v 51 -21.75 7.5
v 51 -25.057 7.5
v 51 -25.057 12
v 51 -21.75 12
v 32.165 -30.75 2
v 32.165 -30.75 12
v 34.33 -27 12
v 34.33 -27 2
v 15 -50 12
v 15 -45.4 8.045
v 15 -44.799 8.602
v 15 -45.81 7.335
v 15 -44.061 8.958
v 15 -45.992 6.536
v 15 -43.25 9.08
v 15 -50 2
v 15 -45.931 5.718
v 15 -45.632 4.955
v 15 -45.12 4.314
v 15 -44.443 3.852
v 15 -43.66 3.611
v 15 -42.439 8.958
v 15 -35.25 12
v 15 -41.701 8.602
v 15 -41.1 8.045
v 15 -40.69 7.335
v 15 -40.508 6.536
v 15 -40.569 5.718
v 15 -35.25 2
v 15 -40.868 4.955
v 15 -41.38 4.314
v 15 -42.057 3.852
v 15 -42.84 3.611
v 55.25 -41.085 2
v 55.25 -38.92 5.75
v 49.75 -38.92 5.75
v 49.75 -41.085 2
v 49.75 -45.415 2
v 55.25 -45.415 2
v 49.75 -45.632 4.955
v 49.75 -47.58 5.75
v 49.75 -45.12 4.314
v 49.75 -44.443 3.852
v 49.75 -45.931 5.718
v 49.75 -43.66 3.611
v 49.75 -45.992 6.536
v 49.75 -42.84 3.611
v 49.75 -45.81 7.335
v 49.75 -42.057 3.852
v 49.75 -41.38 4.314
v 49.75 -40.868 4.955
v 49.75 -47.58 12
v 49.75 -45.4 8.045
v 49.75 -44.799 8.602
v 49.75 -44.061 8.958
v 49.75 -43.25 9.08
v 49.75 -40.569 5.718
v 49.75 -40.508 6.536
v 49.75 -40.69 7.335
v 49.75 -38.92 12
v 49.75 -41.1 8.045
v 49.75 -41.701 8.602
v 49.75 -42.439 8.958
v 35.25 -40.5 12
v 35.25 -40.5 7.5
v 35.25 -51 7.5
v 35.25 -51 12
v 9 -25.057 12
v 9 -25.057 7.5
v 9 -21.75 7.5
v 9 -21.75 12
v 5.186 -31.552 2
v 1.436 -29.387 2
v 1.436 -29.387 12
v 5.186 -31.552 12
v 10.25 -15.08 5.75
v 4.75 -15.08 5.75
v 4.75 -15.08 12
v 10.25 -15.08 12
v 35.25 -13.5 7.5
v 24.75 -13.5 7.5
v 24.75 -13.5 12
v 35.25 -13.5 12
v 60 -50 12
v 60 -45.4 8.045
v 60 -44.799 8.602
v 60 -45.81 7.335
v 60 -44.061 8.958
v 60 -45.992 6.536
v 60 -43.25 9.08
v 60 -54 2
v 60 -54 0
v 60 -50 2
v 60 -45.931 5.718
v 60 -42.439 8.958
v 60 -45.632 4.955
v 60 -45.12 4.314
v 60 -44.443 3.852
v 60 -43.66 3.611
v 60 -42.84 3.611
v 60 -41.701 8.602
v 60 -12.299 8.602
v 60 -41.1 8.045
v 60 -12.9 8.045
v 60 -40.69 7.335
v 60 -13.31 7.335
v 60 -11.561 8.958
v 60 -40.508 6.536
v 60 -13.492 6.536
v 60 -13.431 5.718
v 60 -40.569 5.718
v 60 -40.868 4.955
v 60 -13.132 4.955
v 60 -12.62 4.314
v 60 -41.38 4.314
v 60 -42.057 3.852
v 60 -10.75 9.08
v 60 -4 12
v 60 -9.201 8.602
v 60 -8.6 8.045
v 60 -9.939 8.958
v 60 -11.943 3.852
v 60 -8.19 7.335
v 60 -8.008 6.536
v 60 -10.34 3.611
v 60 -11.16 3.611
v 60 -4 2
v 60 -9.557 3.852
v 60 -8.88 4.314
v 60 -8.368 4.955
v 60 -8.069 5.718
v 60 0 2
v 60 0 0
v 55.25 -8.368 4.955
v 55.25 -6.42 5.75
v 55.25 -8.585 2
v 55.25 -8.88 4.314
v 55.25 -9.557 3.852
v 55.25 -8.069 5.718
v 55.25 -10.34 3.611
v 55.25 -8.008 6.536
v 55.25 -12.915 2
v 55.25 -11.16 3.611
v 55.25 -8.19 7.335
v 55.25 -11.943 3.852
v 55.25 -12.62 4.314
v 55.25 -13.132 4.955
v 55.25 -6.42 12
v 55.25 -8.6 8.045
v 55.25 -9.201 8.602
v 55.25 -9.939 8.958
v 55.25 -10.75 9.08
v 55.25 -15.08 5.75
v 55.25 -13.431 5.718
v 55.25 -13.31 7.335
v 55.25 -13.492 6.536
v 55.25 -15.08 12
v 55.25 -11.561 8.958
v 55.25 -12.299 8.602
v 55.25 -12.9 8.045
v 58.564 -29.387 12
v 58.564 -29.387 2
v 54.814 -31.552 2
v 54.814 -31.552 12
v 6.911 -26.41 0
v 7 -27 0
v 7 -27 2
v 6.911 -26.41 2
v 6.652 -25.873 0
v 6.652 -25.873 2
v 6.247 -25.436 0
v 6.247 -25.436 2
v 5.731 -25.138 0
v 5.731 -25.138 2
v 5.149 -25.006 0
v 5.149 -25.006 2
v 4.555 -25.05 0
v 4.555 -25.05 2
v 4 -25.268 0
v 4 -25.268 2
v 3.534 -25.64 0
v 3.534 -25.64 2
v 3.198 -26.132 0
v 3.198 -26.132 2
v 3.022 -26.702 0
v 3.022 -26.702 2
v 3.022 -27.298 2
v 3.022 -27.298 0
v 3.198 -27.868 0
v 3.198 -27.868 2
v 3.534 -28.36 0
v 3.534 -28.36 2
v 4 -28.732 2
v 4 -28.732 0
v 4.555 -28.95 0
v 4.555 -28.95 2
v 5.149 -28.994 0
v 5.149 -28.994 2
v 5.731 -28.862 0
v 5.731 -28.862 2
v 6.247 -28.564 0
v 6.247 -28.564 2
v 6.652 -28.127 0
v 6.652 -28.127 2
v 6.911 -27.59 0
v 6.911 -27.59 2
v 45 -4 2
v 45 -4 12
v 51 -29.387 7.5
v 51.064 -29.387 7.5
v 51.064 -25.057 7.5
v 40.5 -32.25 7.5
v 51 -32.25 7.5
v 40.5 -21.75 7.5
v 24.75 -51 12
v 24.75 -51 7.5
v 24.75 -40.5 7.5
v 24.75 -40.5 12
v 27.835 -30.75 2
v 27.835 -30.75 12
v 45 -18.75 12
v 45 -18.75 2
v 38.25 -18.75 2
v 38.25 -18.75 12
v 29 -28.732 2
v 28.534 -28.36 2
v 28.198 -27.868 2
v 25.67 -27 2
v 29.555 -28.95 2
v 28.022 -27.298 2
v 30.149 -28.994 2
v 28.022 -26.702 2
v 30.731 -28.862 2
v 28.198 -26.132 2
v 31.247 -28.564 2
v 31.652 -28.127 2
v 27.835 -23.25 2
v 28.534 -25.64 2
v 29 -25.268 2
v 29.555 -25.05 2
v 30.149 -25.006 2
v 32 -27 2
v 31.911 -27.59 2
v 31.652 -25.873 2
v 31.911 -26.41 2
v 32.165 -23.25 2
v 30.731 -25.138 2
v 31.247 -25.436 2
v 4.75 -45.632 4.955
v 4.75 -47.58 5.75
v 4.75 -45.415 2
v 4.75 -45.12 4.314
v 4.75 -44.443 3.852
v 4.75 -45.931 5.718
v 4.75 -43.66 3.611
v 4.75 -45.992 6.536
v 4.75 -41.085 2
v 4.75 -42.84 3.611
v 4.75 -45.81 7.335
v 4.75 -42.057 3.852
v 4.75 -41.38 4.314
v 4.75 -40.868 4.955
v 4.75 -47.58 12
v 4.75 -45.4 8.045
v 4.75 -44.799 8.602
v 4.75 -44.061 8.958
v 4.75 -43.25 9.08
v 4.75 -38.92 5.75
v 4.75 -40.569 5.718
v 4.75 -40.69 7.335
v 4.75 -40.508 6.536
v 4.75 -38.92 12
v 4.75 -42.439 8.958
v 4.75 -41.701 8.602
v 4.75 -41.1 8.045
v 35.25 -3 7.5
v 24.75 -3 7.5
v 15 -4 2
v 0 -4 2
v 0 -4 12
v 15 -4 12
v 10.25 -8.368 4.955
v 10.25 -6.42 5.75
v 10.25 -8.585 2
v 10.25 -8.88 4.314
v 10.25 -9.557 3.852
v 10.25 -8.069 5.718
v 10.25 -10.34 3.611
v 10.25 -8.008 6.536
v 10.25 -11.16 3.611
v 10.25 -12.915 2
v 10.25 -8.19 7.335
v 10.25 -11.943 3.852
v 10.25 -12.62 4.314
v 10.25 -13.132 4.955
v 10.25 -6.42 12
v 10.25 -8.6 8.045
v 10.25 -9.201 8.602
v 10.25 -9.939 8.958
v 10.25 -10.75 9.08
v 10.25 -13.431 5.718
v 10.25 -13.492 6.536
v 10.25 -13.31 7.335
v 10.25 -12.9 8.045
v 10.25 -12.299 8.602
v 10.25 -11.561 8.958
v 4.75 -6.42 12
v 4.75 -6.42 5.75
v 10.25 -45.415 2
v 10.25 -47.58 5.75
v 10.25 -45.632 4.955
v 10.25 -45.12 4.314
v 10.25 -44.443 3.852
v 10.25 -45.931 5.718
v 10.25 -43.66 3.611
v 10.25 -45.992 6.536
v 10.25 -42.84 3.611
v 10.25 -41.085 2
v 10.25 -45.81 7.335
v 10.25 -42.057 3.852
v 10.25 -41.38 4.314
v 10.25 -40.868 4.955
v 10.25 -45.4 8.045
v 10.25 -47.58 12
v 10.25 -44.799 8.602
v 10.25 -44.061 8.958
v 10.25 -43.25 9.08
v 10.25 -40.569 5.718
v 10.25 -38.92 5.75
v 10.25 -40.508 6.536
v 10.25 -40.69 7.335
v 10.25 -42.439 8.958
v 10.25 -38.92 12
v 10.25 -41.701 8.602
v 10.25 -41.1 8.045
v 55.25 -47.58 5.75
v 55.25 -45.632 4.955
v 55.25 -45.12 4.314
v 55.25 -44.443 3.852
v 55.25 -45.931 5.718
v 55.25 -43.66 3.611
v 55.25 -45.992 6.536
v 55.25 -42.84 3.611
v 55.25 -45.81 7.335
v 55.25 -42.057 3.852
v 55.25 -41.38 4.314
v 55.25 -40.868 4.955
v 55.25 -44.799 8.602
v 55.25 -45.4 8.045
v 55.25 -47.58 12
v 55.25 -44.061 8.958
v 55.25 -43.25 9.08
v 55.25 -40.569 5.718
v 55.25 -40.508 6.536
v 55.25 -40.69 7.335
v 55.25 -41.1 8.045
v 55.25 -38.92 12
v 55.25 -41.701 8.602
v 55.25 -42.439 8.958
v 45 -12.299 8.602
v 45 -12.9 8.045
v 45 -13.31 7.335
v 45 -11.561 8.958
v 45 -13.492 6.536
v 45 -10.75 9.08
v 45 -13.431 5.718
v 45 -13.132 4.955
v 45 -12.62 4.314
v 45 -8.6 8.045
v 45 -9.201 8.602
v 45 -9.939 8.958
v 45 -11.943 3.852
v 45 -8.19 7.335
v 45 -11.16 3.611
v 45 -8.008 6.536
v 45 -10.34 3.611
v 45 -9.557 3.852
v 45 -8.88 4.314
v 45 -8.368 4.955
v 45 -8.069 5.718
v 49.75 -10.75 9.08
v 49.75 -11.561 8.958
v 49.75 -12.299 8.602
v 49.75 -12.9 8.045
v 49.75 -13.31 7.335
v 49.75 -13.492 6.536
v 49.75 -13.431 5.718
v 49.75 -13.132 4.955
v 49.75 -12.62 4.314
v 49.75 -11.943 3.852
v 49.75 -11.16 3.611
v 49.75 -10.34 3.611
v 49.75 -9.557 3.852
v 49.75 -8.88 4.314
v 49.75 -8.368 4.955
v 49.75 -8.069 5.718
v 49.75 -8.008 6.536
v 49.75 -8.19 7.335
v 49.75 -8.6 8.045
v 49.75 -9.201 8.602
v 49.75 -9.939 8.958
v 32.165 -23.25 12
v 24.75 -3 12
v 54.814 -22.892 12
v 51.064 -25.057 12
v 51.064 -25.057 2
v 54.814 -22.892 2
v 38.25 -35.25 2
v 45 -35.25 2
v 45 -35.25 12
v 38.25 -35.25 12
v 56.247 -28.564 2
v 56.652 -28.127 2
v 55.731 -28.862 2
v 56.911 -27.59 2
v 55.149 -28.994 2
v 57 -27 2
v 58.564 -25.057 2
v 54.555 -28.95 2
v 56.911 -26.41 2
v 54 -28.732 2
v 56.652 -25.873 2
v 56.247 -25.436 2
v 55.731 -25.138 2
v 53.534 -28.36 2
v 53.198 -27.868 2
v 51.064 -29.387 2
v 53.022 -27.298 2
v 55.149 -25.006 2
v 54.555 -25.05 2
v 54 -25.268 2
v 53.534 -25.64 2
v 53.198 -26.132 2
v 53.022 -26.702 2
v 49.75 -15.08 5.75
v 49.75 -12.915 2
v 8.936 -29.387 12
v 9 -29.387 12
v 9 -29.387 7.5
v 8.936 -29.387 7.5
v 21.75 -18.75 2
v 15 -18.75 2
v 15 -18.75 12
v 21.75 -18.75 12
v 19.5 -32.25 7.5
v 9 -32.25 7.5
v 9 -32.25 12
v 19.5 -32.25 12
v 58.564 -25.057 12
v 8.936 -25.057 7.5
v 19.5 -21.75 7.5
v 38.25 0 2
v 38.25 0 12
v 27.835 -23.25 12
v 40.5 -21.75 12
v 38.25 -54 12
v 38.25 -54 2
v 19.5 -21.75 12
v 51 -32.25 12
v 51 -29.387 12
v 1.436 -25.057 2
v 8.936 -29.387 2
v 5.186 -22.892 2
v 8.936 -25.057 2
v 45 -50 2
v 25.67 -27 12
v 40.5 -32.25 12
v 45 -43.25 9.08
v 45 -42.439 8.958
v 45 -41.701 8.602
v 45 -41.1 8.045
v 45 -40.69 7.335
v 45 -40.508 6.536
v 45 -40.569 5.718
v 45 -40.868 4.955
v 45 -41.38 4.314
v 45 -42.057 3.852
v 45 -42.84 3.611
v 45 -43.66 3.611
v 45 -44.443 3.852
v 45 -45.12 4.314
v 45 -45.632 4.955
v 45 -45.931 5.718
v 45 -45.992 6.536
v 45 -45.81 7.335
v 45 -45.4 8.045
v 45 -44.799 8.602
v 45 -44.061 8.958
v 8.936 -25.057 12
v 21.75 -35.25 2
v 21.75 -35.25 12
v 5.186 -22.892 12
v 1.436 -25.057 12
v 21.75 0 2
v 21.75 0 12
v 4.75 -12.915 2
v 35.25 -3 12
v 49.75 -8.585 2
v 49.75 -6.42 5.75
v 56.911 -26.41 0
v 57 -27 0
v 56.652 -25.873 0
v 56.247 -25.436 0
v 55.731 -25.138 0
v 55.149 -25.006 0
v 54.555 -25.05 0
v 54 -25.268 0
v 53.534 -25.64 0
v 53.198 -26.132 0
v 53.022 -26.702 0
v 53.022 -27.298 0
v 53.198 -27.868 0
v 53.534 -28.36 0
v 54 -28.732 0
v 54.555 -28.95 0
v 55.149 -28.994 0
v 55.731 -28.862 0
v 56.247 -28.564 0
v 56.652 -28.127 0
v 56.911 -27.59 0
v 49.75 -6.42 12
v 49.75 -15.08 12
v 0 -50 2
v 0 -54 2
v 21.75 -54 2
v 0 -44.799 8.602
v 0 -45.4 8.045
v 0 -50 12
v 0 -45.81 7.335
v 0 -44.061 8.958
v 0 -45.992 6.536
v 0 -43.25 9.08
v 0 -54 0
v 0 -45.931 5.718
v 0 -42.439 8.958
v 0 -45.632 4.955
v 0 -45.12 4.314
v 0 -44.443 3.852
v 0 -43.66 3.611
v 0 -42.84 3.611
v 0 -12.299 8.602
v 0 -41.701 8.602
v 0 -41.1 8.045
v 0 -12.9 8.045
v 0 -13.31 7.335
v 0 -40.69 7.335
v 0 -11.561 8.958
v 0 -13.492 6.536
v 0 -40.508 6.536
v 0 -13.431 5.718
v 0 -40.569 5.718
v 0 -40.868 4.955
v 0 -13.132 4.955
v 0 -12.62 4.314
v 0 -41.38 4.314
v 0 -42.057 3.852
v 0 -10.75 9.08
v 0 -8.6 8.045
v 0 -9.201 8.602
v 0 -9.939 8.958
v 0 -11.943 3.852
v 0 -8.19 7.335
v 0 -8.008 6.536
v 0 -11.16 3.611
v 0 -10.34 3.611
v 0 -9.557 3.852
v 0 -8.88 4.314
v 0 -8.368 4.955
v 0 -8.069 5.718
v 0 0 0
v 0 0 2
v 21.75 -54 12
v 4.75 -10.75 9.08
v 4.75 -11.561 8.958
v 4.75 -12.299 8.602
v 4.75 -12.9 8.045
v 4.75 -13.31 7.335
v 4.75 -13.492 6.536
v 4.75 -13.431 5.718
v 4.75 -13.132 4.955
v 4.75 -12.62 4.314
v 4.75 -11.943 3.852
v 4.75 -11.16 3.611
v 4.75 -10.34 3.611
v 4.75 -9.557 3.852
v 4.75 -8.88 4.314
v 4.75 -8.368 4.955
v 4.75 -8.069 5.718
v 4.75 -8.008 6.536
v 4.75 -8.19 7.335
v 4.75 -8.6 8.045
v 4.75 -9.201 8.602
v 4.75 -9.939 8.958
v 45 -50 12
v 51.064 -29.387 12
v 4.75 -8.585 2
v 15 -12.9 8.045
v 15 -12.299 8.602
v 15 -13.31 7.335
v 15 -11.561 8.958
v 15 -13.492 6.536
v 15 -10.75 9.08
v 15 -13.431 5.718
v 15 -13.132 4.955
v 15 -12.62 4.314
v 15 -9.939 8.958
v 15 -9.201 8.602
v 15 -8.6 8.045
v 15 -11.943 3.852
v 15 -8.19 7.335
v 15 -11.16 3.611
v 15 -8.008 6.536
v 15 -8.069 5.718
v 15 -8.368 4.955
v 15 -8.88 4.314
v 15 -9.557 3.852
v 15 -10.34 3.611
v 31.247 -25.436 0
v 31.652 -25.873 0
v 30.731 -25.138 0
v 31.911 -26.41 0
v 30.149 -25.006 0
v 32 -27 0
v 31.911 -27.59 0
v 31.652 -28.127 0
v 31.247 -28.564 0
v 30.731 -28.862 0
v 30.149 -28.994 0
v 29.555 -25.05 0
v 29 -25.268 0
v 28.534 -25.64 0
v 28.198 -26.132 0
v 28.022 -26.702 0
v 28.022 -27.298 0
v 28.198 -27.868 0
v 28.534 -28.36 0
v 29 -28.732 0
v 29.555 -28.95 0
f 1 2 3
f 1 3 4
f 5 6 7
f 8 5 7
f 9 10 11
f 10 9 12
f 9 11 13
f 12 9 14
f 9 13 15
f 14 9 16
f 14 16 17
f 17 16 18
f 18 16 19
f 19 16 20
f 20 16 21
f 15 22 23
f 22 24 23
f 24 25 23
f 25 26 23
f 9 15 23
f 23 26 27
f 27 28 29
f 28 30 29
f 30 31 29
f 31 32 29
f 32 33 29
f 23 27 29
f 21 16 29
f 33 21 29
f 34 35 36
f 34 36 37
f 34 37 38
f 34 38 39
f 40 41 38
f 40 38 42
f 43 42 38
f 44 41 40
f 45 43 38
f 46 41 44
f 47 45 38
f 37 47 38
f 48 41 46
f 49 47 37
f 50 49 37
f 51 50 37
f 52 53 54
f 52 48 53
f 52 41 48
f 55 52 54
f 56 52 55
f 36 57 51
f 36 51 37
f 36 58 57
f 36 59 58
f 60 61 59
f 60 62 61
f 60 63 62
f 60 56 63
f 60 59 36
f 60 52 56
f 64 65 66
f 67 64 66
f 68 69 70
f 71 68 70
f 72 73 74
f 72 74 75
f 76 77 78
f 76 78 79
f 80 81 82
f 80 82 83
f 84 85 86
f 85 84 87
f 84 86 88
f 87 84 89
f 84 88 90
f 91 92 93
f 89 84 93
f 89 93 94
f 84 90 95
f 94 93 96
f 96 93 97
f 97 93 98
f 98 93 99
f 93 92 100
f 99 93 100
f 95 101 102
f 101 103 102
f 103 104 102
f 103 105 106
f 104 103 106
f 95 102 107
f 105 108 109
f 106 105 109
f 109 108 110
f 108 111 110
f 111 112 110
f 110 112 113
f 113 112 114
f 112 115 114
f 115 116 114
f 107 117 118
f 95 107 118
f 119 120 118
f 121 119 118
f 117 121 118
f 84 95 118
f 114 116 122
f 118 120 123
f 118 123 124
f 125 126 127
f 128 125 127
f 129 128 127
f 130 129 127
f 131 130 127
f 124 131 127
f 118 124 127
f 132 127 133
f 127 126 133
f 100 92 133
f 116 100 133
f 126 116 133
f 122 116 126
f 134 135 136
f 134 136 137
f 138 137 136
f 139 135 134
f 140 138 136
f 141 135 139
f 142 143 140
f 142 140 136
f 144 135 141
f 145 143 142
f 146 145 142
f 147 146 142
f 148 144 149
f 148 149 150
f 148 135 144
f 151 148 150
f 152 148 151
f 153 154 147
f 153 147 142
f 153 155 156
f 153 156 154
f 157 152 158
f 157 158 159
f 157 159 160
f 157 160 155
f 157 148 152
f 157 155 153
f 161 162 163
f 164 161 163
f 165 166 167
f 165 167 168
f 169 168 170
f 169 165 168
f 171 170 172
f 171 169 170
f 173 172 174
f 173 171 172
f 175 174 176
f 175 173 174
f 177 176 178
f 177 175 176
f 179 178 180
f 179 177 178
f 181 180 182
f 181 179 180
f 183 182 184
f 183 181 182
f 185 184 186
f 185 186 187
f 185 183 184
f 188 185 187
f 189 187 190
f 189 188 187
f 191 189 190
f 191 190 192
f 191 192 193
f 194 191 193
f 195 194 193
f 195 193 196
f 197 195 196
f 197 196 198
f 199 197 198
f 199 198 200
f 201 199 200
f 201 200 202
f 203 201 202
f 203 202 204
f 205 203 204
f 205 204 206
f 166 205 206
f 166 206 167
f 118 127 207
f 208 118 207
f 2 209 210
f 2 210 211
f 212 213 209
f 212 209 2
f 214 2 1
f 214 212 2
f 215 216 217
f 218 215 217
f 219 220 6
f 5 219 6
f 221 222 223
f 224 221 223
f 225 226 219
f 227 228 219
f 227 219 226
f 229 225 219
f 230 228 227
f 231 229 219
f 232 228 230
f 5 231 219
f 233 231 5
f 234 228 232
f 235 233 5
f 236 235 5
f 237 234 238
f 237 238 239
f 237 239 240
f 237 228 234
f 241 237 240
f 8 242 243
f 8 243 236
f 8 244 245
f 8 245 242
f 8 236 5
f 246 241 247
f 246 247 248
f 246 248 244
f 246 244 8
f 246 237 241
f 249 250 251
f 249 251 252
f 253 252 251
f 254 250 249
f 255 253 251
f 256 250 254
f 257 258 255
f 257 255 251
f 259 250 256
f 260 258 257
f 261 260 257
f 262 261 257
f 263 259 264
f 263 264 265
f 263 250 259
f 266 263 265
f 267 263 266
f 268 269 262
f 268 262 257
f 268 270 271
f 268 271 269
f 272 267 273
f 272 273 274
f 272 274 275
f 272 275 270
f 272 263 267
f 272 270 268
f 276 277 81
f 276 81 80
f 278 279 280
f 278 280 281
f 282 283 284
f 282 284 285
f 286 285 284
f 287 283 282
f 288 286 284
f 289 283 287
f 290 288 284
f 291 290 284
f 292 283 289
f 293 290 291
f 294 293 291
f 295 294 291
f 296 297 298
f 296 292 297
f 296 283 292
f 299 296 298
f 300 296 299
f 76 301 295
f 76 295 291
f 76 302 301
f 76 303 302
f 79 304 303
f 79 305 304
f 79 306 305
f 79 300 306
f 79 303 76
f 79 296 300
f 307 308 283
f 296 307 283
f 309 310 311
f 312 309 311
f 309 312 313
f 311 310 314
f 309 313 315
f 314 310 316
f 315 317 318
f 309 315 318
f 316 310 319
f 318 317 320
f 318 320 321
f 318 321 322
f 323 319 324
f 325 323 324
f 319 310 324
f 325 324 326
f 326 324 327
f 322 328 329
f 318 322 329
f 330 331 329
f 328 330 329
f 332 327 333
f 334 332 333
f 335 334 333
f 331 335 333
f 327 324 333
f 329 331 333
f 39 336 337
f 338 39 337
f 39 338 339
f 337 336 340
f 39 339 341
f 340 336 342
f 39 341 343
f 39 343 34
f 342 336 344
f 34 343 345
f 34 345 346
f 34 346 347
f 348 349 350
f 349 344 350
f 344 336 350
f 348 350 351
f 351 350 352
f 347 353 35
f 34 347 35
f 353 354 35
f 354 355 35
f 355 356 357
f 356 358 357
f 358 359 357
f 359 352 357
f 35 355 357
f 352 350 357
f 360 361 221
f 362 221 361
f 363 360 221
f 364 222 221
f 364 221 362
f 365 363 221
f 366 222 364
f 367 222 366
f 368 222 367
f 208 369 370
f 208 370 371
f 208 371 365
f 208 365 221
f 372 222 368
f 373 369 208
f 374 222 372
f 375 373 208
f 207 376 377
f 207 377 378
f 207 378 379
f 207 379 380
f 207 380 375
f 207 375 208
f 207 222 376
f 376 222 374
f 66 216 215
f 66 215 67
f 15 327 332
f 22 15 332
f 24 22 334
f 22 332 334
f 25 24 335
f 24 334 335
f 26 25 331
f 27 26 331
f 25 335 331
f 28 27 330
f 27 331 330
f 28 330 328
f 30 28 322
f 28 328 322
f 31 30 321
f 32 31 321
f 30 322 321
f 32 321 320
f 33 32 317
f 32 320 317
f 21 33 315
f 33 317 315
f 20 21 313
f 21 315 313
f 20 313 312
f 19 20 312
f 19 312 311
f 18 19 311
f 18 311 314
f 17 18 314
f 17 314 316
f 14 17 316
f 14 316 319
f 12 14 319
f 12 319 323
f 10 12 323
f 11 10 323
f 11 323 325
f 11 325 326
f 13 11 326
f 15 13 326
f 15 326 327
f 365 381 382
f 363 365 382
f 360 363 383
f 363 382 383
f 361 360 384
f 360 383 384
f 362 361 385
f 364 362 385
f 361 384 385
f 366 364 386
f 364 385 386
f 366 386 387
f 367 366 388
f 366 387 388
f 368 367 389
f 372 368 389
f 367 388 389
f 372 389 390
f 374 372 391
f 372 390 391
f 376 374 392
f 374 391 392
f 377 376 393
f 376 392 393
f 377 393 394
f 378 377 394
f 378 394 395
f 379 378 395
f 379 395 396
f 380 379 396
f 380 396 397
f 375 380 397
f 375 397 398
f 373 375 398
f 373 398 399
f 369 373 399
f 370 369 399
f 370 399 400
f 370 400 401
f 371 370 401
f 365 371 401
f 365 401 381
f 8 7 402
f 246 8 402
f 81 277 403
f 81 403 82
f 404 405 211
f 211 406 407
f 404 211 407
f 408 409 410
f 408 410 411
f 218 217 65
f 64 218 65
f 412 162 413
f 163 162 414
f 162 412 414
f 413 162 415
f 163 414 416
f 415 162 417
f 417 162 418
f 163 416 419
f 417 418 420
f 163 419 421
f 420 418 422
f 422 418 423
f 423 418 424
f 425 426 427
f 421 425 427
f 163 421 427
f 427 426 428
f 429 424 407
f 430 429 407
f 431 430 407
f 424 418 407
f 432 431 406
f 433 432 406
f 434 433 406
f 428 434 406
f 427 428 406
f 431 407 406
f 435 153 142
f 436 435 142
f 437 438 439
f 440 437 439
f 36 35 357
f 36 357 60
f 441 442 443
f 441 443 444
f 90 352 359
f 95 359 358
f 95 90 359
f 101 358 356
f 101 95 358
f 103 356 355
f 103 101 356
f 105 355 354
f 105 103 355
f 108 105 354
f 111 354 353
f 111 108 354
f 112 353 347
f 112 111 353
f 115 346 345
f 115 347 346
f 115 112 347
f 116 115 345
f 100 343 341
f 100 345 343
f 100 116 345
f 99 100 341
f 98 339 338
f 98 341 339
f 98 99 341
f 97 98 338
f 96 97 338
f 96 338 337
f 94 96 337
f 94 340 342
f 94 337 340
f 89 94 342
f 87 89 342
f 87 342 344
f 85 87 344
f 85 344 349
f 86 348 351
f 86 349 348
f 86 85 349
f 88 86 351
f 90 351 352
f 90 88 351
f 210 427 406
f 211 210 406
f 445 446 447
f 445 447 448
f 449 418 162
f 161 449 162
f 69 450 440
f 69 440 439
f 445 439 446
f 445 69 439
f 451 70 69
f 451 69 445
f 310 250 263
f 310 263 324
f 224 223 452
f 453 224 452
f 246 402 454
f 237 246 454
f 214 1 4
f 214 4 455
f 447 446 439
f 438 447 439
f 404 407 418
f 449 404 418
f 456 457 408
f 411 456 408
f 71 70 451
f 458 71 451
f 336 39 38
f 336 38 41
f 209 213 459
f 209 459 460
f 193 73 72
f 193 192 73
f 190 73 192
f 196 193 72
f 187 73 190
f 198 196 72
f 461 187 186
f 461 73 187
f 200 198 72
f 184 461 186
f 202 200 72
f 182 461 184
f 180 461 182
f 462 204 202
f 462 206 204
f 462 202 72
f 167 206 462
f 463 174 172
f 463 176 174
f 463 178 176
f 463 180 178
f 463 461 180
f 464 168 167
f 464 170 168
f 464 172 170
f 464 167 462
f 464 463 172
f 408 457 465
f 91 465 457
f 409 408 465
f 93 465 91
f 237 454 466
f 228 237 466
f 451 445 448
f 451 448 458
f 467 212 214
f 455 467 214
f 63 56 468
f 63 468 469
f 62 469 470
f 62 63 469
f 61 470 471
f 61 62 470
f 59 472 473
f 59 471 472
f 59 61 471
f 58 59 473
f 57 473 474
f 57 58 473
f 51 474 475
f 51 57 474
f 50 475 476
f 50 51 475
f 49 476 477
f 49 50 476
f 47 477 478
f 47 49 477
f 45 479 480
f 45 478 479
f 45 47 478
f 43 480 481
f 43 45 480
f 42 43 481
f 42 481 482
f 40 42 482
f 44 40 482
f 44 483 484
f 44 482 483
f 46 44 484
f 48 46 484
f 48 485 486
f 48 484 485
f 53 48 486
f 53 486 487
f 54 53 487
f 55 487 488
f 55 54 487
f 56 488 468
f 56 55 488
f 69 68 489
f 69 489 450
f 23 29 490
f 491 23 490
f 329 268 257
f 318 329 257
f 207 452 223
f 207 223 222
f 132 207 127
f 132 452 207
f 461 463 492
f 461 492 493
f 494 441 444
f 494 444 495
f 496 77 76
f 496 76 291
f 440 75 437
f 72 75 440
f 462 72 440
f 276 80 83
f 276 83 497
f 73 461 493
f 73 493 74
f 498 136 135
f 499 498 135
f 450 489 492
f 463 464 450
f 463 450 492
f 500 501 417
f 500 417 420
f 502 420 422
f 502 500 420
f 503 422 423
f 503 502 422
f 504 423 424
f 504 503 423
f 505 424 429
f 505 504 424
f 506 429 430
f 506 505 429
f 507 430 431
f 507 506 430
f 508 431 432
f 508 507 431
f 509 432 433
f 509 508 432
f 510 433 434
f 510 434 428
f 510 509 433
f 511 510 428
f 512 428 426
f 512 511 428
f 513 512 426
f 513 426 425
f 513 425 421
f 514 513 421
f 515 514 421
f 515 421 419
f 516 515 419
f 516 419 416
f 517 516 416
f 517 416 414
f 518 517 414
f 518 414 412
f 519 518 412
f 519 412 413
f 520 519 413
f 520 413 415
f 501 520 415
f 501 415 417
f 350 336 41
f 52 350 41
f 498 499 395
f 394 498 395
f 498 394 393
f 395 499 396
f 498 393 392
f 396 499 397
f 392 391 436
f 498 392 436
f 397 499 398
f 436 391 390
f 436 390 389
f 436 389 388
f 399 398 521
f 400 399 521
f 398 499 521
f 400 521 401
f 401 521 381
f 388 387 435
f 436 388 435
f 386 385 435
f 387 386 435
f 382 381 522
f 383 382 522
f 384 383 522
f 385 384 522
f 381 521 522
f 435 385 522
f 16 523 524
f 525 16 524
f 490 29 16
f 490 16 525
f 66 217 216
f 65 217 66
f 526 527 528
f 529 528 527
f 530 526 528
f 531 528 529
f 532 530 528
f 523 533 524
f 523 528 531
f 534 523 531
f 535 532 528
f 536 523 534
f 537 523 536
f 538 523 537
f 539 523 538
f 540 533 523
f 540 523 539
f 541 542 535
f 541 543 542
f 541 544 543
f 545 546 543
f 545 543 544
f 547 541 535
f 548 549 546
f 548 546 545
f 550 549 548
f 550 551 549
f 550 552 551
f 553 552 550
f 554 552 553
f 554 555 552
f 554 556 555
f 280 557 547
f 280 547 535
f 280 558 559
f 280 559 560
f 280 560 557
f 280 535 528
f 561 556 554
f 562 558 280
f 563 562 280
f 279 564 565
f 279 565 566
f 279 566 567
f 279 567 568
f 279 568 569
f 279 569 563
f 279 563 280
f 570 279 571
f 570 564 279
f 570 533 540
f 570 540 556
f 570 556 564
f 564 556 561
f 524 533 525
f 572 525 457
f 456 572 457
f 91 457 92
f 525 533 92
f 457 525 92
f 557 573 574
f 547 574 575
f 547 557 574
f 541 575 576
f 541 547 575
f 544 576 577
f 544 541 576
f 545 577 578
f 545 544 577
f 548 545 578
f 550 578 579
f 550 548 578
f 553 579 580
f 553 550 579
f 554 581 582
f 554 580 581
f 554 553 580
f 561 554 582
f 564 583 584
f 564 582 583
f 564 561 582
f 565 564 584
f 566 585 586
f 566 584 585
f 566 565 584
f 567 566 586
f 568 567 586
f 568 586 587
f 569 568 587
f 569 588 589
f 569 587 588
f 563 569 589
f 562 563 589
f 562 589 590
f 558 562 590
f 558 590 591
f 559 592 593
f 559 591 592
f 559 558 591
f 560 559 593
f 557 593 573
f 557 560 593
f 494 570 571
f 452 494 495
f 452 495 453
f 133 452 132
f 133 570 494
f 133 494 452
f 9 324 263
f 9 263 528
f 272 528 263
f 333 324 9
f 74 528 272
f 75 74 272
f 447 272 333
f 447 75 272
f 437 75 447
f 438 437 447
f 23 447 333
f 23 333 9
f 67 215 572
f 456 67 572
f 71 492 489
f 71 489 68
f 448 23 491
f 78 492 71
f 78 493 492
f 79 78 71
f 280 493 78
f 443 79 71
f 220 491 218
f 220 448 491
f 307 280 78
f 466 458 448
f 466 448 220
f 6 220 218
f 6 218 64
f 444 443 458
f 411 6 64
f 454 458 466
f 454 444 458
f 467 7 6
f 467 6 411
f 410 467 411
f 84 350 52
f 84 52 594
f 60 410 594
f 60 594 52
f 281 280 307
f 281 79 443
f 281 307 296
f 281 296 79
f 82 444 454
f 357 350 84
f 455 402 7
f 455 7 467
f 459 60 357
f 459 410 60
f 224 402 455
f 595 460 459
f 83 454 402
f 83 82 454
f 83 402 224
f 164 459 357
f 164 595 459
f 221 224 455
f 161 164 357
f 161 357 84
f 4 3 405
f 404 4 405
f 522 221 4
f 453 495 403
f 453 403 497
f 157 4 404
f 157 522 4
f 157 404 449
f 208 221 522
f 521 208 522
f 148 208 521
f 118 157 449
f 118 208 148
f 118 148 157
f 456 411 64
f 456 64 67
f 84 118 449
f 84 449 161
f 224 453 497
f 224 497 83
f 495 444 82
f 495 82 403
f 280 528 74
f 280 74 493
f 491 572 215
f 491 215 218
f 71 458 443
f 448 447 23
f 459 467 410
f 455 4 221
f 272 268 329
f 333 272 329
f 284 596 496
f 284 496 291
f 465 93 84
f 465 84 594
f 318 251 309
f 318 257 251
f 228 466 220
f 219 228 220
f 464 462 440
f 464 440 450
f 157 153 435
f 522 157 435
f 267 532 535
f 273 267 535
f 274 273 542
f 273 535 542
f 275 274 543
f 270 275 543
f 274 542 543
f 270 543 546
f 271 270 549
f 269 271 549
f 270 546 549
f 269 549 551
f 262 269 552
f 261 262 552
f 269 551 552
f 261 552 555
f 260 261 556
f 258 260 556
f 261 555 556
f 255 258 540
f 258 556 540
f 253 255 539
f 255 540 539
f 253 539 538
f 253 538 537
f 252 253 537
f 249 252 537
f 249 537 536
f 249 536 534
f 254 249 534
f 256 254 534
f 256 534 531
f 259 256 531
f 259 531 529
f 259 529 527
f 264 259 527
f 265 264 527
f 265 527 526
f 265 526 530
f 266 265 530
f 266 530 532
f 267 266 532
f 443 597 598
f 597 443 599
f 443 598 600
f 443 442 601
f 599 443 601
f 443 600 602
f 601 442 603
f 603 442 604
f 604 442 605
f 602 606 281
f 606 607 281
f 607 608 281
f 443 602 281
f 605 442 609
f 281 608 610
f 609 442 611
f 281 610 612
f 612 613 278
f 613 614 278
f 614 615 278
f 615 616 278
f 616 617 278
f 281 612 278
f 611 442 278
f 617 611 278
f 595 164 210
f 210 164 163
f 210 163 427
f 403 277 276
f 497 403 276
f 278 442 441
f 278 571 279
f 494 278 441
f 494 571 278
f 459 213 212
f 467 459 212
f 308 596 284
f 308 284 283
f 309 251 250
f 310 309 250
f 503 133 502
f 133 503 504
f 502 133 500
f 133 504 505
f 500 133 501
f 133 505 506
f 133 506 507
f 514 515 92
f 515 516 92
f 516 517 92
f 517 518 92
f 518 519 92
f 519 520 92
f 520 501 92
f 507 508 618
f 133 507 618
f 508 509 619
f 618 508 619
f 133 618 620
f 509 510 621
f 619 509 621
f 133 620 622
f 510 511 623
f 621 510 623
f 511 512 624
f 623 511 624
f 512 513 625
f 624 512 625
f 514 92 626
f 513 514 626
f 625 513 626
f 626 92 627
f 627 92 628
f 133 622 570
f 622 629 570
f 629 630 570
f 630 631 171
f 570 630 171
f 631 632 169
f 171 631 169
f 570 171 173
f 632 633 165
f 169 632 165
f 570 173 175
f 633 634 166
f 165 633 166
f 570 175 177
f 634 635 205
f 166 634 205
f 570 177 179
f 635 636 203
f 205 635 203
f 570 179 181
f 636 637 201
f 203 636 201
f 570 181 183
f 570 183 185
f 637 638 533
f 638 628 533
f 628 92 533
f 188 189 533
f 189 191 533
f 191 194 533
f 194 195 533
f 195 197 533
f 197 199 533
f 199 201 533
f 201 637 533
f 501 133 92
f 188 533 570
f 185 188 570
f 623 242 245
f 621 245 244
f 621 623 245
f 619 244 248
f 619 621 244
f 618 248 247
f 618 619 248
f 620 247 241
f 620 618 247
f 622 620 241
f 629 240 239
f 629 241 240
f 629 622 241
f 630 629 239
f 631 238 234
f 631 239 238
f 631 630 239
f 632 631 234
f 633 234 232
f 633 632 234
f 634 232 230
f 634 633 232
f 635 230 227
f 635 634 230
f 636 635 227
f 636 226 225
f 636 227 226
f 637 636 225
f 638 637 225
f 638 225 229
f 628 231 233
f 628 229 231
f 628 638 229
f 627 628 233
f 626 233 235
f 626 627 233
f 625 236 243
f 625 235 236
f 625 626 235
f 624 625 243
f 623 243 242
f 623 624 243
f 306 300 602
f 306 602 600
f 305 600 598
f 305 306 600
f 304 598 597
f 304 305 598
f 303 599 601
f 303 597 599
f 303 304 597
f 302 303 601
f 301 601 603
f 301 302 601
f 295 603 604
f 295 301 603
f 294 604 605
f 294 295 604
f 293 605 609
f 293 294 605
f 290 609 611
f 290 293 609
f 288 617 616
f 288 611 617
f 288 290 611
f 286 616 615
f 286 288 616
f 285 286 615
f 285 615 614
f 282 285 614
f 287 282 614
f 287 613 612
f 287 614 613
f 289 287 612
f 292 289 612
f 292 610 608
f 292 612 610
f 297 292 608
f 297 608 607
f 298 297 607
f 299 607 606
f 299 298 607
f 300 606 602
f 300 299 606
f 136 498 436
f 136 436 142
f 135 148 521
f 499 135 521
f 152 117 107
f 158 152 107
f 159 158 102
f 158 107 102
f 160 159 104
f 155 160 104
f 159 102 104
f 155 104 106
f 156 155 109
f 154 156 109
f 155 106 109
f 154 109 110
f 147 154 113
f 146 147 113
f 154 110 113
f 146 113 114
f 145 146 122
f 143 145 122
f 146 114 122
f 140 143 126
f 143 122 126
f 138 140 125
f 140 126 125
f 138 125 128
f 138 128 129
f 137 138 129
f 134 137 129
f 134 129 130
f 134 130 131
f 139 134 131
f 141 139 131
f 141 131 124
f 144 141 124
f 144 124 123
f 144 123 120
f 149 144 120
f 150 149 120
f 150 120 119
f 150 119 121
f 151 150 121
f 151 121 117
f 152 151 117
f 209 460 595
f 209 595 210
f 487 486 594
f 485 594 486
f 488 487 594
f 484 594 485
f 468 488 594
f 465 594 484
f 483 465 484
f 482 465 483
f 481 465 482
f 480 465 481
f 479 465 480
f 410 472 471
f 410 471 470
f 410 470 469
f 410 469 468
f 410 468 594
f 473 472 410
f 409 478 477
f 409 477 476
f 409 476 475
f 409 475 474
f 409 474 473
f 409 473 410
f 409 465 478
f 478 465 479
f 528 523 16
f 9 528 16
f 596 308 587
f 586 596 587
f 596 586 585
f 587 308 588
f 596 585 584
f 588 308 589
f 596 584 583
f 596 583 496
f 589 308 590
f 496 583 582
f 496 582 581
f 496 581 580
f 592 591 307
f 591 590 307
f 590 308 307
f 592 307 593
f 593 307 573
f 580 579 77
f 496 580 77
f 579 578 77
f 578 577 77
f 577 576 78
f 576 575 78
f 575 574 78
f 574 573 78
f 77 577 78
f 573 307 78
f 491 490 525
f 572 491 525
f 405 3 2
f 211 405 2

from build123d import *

# Parameters (mm, degrees)
ESQUISSE1_W               = 60
ESQUISSE1_H               = 54
ESQUISSE1_R               = 2
BOSS_EXTRU_1_DEPTH        = 2
ESQUISSE2_W               = 15
ESQUISSE2_H               = 13.5
BOSS_EXTRU_2_DEPTH        = 10
ENL_V_MAT_EXTRU_2_DEPTH   = 16
ESQUISSE5_W               = 4.75
ESQUISSE5_H               = 13.5
BOSS_EXTRU_3_DEPTH        = 12
ESQUISSE6_W               = 5.5
ESQUISSE6_H               = 8.66
ENL_V_MAT_EXTRU_3_DEPTH   = 6.25
ESQUISSE7_R               = 2.75
ENL_V_MAT_EXTRU_4_DEPTH   = 28
SYM_TRIE2_COPY_1_SKETCH_W = 15
SYM_TRIE2_COPY_1_SKETCH_H = 13.5
SYM_TRIE2_COPY_1_DEPTH    = 10
SYM_TRIE2_COPY_2_DEPTH    = 16
SYM_TRIE2_COPY_3_SKETCH_W = 4.75
SYM_TRIE2_COPY_3_SKETCH_H = 13.5
SYM_TRIE2_COPY_3_DEPTH    = 12
SYM_TRIE2_COPY_4_SKETCH_W = 5.5
SYM_TRIE2_COPY_4_SKETCH_H = 8.66
SYM_TRIE2_COPY_4_DEPTH    = 6.25
SYM_TRIE2_COPY_5_SKETCH_R = 2.75
SYM_TRIE2_COPY_5_DEPTH    = 28
ESQUISSE8_W               = 10.5
ESQUISSE8_H               = 3
BOSS_EXTRU_4_DEPTH        = 10
ESQUISSE12_W              = 15
ESQUISSE12_H              = 19
BOSS_EXTRU_6_DEPTH        = 10
ESQUISSE9_W               = 16.5
ESQUISSE9_H               = 16.5
ESQUISSE9_W_2             = 10.5
ESQUISSE9_H_2             = 10.5
BOSS_EXTRU_7_DEPTH        = 10
ENL_V_MAT_EXTRU_6_DEPTH   = 21
ESQUISSE13_W              = 10.5
ESQUISSE13_H              = 10.5
ENL_V_MAT_EXTRU_7_DEPTH   = 21
ESQUISSE15_R              = 2
ESQUISSE15_W              = 0.75
ESQUISSE15_H              = 2.25
BOSS_EXTRU_9_DEPTH        = 10
ENL_V_MAT_EXTRU_8_DEPTH   = 10
ESQUISSE17_W              = 10.5
ESQUISSE17_H              = 10.5
BOSS_EXTRU_10_DEPTH       = 5.5
ESQUISSE18_W              = 4.5
ESQUISSE18_H              = 4.330127019
ENL_V_MAT_EXTRU_9_DEPTH   = 1.5


with BuildPart() as part:
    # Esquisse1 → Boss.-Extru.1 (new body)
    with BuildSketch(Plane.XY):
        with Locations((30, -27)):
            Rectangle(ESQUISSE1_W, ESQUISSE1_H)
        with Locations((5, -27)):
            Circle(ESQUISSE1_R, mode=Mode.SUBTRACT)
        with Locations((30, -27)):
            Circle(ESQUISSE1_R, mode=Mode.SUBTRACT)
        with Locations((55, -27)):
            Circle(ESQUISSE1_R, mode=Mode.SUBTRACT)
    extrude(amount=BOSS_EXTRU_1_DEPTH)

    # Esquisse2 → Boss.-Extru.2 (add)
    with BuildSketch(Plane.XY.offset(2)):
        with Locations((7.5, -43.25)):
            Rectangle(ESQUISSE2_W, ESQUISSE2_H)
    boss_extru_2 = extrude(amount=BOSS_EXTRU_2_DEPTH)

    # Esquisse4 → Enlèv. mat.-Extru.2 (cut)
    with BuildSketch(Plane.ZY):
        Polygon((9.5, -45.415063509), (9.5, -41.084936491), (5.75, -38.919872981), (2, -41.084936491), (2, -45.415063509), (5.75, -47.580127019), align=None)
    enl_v_mat_extru_2 = extrude(amount=-ENL_V_MAT_EXTRU_2_DEPTH, mode=Mode.SUBTRACT)

    # Esquisse5 → Boss.-Extru.3 (add)
    with BuildSketch(Plane.XY.offset(12)):
        with Locations((2.375, -43.25)):
            Rectangle(ESQUISSE5_W, ESQUISSE5_H)
        with Locations((12.625, -43.25)):
            Rectangle(ESQUISSE5_W, ESQUISSE5_H)
    boss_extru_3 = extrude(amount=-BOSS_EXTRU_3_DEPTH)

    # Esquisse6 → Enlèv. mat.-Extru.3 (cut)
    with BuildSketch(Plane.XY.offset(12)):
        with Locations((7.5, -43.25)):
            Rectangle(ESQUISSE6_W, ESQUISSE6_H)
    enl_v_mat_extru_3 = extrude(amount=-ENL_V_MAT_EXTRU_3_DEPTH, mode=Mode.SUBTRACT)

    # Esquisse7 → Enlèv. mat.-Extru.4 (cut)
    with BuildSketch(Plane.ZY):
        with Locations((6.33, -43.25)):
            Circle(ESQUISSE7_R)
    enl_v_mat_extru_4 = extrude(amount=-ENL_V_MAT_EXTRU_4_DEPTH, mode=Mode.SUBTRACT)

    # Symétrie1: Boss.-Extru.2, Enlèv. mat.-Extru.2, Boss.-Extru.3, Enlèv. mat.-Extru.3, Enlèv. mat.-Extru.4 across plane
    add(boss_extru_2.mirror(Plane(origin=(0, -27, 0), x_dir=(0, 0, 1), z_dir=(0, -1, 0))))
    add(enl_v_mat_extru_2.mirror(Plane(origin=(0, -27, 0), x_dir=(0, 0, 1), z_dir=(0, -1, 0))), mode=Mode.SUBTRACT)
    add(boss_extru_3.mirror(Plane(origin=(0, -27, 0), x_dir=(0, 0, 1), z_dir=(0, -1, 0))))
    add(enl_v_mat_extru_3.mirror(Plane(origin=(0, -27, 0), x_dir=(0, 0, 1), z_dir=(0, -1, 0))), mode=Mode.SUBTRACT)
    add(enl_v_mat_extru_4.mirror(Plane(origin=(0, -27, 0), x_dir=(0, 0, 1), z_dir=(0, -1, 0))), mode=Mode.SUBTRACT)

    # Symétrie2: Boss.-Extru.2, Enlèv. mat.-Extru.2, Boss.-Extru.3, Enlèv. mat.-Extru.3, Enlèv. mat.-Extru.4 across plane
    add(boss_extru_2.mirror(Plane.ZY.offset(-30)))
    add(enl_v_mat_extru_2.mirror(Plane.ZY.offset(-30)), mode=Mode.SUBTRACT)
    add(boss_extru_3.mirror(Plane.ZY.offset(-30)))
    add(enl_v_mat_extru_3.mirror(Plane.ZY.offset(-30)), mode=Mode.SUBTRACT)
    add(enl_v_mat_extru_4.mirror(Plane.ZY.offset(-30)), mode=Mode.SUBTRACT)

    # Symétrie2 copy 1 sketch → Symétrie2 copy 1 (add)
    with BuildSketch(Plane(origin=(60, -54, 2), x_dir=(-1, 0, 0), z_dir=(0, 0, 1))):
        with Locations((7.5, -43.25)):
            Rectangle(SYM_TRIE2_COPY_1_SKETCH_W, SYM_TRIE2_COPY_1_SKETCH_H)
    extrude(amount=SYM_TRIE2_COPY_1_DEPTH)

    # Symétrie2 copy 2 sketch → Symétrie2 copy 2 (cut)
    with BuildSketch(Plane(origin=(60, -54, 0), x_dir=(0, 0, 1), z_dir=(1, 0, 0))):
        Polygon((9.5, -45.415063509), (9.5, -41.084936491), (5.75, -38.919872981), (2, -41.084936491), (2, -45.415063509), (5.75, -47.580127019), align=None)
    extrude(amount=-SYM_TRIE2_COPY_2_DEPTH, mode=Mode.SUBTRACT)

    # Symétrie2 copy 3 sketch → Symétrie2 copy 3 (add)
    with BuildSketch(Plane(origin=(60, -54, 12), x_dir=(-1, 0, 0), z_dir=(0, 0, 1))):
        with Locations((2.375, -43.25)):
            Rectangle(SYM_TRIE2_COPY_3_SKETCH_W, SYM_TRIE2_COPY_3_SKETCH_H)
        with Locations((12.625, -43.25)):
            Rectangle(SYM_TRIE2_COPY_3_SKETCH_W, SYM_TRIE2_COPY_3_SKETCH_H)
    extrude(amount=-SYM_TRIE2_COPY_3_DEPTH)

    # Symétrie2 copy 4 sketch → Symétrie2 copy 4 (cut)
    with BuildSketch(Plane(origin=(60, -54, 12), x_dir=(-1, 0, 0), z_dir=(0, 0, 1))):
        with Locations((7.5, -43.25)):
            Rectangle(SYM_TRIE2_COPY_4_SKETCH_W, SYM_TRIE2_COPY_4_SKETCH_H)
    extrude(amount=-SYM_TRIE2_COPY_4_DEPTH, mode=Mode.SUBTRACT)

    # Symétrie2 copy 5 sketch → Symétrie2 copy 5 (cut)
    with BuildSketch(Plane(origin=(60, -54, 0), x_dir=(0, 0, 1), z_dir=(1, 0, 0))):
        with Locations((6.33, -43.25)):
            Circle(SYM_TRIE2_COPY_5_SKETCH_R)
    extrude(amount=-SYM_TRIE2_COPY_5_DEPTH, mode=Mode.SUBTRACT)

    # Esquisse8 → Boss.-Extru.4 (add)
    with BuildSketch(Plane.XY.offset(2)):
        Polygon((35.25, -51), (35.25, -54), (38.25, -54), (38.25, -37.5), (21.75, -37.5), (21.75, -54), (24.75, -54), (24.75, -51), (24.75, -40.5), (35.25, -40.5), align=None)
        with Locations((30, -52.5)):
            Rectangle(ESQUISSE8_W, ESQUISSE8_H)
    boss_extru_4 = extrude(amount=BOSS_EXTRU_4_DEPTH)

    # Esquisse12 → Boss.-Extru.6 (add)
    with BuildSketch(Plane.XY.offset(2)):
        with Locations((7.5, -27)):
            Rectangle(ESQUISSE12_W, ESQUISSE12_H)
    boss_extru_6 = extrude(amount=BOSS_EXTRU_6_DEPTH)

    # Esquisse9 → Boss.-Extru.7 (add)
    with BuildSketch(Plane.XY.offset(2)):
        with Locations((14.25, -27)):
            Rectangle(ESQUISSE9_W, ESQUISSE9_H)
        with Locations((14.25, -27)):
            Rectangle(ESQUISSE9_W_2, ESQUISSE9_H_2, mode=Mode.SUBTRACT)
    boss_extru_7 = extrude(amount=BOSS_EXTRU_7_DEPTH)

    # Esquisse11 → Enlèv. mat.-Extru.6 (cut)
    with BuildSketch(Plane.XY.offset(2)):
        Polygon((8.935840957, -29.386947115), (8.935840957, -25.056820096), (5.185840957, -22.891756586), (1.435840957, -25.056820096), (1.435840957, -29.386947115), (5.185840957, -31.552010624), align=None)
    enl_v_mat_extru_6 = extrude(amount=ENL_V_MAT_EXTRU_6_DEPTH, mode=Mode.SUBTRACT)

    # Esquisse13 → Enlèv. mat.-Extru.7 (cut)
    with BuildSketch(Plane.XY.offset(2)):
        with Locations((14.25, -27)):
            Rectangle(ESQUISSE13_W, ESQUISSE13_H)
    enl_v_mat_extru_7 = extrude(amount=ENL_V_MAT_EXTRU_7_DEPTH, mode=Mode.SUBTRACT)

    # Symétrie3: Boss.-Extru.6, Boss.-Extru.7, Enlèv. mat.-Extru.6, Enlèv. mat.-Extru.7 across plane
    add(boss_extru_6.mirror(Plane.ZY.offset(-30)))
    add(boss_extru_7.mirror(Plane.ZY.offset(-30)))
    add(enl_v_mat_extru_6.mirror(Plane.ZY.offset(-30)), mode=Mode.SUBTRACT)
    add(enl_v_mat_extru_7.mirror(Plane.ZY.offset(-30)), mode=Mode.SUBTRACT)

    # Symétrie4: Boss.-Extru.4 across plane
    add(boss_extru_4.mirror(Plane(origin=(0, -27, 0), x_dir=(0, 0, 1), z_dir=(0, -1, 0))))

    # Esquisse15 → Boss.-Extru.9 (add)
    # profile 1 of 5: a face of its own
    with BuildSketch(Plane.XY.offset(2)):
        Polygon((22.5, -35.25), (22.5, -37.5), (37.5, -37.5), (37.5, -35.25), (37.5, -18.75), (37.5, -16.5), (22.5, -16.5), (22.5, -18.75), align=None)
        with Locations((30, -27)):
            Circle(ESQUISSE15_R, mode=Mode.SUBTRACT)
    # profile 2 of 5: a face of its own
    with BuildSketch(Plane.XY.offset(2)):
        with Locations((22.125, -36.375)):
            Rectangle(ESQUISSE15_W, ESQUISSE15_H)
    # profile 3 of 5: a face of its own
    with BuildSketch(Plane.XY.offset(2)):
        with Locations((37.875, -36.375)):
            Rectangle(ESQUISSE15_W, ESQUISSE15_H)
    # profile 4 of 5: a face of its own
    with BuildSketch(Plane.XY.offset(2)):
        with Locations((37.875, -17.625)):
            Rectangle(ESQUISSE15_W, ESQUISSE15_H)
    # profile 5 of 5: a face of its own
    with BuildSketch(Plane.XY.offset(2)):
        with Locations((22.125, -17.625)):
            Rectangle(ESQUISSE15_W, ESQUISSE15_H)
    extrude(amount=BOSS_EXTRU_9_DEPTH)

    # Esquisse16 → Enlèv. mat.-Extru.8 (cut)
    with BuildSketch(Plane.XY.offset(12)):
        Polygon((32.165063509, -23.25), (27.834936491, -23.25), (25.669872981, -27), (27.834936491, -30.75), (32.165063509, -30.75), (34.330127019, -27), align=None)
    extrude(amount=-ENL_V_MAT_EXTRU_8_DEPTH, mode=Mode.SUBTRACT)

    # Esquisse17 → Boss.-Extru.10 (add)
    with BuildSketch(Plane.XY.offset(2)):
        with Locations((14.25, -27)):
            Rectangle(ESQUISSE17_W, ESQUISSE17_H)
        with Locations((45.75, -27)):
            Rectangle(ESQUISSE17_W, ESQUISSE17_H)
        with Locations((30, -8.25)):
            Rectangle(ESQUISSE17_W, ESQUISSE17_H)
        with Locations((30, -45.75)):
            Rectangle(ESQUISSE17_W, ESQUISSE17_H)
    extrude(amount=BOSS_EXTRU_10_DEPTH)

    # Esquisse18 → Enlèv. mat.-Extru.9 (cut)
    with BuildSketch(Plane(origin=(9, 0, 0), x_dir=(0, 0, -1), z_dir=(1, 0, 0))):
        with Locations((-9.75, -27.221883606)):
            Rectangle(ESQUISSE18_W, ESQUISSE18_H)
    enl_v_mat_extru_9 = extrude(amount=-ENL_V_MAT_EXTRU_9_DEPTH, mode=Mode.SUBTRACT)

    # Symétrie5: Enlèv. mat.-Extru.9 across plane
    add(enl_v_mat_extru_9.mirror(Plane.ZY.offset(-30)), mode=Mode.SUBTRACT)


solid = part.part
